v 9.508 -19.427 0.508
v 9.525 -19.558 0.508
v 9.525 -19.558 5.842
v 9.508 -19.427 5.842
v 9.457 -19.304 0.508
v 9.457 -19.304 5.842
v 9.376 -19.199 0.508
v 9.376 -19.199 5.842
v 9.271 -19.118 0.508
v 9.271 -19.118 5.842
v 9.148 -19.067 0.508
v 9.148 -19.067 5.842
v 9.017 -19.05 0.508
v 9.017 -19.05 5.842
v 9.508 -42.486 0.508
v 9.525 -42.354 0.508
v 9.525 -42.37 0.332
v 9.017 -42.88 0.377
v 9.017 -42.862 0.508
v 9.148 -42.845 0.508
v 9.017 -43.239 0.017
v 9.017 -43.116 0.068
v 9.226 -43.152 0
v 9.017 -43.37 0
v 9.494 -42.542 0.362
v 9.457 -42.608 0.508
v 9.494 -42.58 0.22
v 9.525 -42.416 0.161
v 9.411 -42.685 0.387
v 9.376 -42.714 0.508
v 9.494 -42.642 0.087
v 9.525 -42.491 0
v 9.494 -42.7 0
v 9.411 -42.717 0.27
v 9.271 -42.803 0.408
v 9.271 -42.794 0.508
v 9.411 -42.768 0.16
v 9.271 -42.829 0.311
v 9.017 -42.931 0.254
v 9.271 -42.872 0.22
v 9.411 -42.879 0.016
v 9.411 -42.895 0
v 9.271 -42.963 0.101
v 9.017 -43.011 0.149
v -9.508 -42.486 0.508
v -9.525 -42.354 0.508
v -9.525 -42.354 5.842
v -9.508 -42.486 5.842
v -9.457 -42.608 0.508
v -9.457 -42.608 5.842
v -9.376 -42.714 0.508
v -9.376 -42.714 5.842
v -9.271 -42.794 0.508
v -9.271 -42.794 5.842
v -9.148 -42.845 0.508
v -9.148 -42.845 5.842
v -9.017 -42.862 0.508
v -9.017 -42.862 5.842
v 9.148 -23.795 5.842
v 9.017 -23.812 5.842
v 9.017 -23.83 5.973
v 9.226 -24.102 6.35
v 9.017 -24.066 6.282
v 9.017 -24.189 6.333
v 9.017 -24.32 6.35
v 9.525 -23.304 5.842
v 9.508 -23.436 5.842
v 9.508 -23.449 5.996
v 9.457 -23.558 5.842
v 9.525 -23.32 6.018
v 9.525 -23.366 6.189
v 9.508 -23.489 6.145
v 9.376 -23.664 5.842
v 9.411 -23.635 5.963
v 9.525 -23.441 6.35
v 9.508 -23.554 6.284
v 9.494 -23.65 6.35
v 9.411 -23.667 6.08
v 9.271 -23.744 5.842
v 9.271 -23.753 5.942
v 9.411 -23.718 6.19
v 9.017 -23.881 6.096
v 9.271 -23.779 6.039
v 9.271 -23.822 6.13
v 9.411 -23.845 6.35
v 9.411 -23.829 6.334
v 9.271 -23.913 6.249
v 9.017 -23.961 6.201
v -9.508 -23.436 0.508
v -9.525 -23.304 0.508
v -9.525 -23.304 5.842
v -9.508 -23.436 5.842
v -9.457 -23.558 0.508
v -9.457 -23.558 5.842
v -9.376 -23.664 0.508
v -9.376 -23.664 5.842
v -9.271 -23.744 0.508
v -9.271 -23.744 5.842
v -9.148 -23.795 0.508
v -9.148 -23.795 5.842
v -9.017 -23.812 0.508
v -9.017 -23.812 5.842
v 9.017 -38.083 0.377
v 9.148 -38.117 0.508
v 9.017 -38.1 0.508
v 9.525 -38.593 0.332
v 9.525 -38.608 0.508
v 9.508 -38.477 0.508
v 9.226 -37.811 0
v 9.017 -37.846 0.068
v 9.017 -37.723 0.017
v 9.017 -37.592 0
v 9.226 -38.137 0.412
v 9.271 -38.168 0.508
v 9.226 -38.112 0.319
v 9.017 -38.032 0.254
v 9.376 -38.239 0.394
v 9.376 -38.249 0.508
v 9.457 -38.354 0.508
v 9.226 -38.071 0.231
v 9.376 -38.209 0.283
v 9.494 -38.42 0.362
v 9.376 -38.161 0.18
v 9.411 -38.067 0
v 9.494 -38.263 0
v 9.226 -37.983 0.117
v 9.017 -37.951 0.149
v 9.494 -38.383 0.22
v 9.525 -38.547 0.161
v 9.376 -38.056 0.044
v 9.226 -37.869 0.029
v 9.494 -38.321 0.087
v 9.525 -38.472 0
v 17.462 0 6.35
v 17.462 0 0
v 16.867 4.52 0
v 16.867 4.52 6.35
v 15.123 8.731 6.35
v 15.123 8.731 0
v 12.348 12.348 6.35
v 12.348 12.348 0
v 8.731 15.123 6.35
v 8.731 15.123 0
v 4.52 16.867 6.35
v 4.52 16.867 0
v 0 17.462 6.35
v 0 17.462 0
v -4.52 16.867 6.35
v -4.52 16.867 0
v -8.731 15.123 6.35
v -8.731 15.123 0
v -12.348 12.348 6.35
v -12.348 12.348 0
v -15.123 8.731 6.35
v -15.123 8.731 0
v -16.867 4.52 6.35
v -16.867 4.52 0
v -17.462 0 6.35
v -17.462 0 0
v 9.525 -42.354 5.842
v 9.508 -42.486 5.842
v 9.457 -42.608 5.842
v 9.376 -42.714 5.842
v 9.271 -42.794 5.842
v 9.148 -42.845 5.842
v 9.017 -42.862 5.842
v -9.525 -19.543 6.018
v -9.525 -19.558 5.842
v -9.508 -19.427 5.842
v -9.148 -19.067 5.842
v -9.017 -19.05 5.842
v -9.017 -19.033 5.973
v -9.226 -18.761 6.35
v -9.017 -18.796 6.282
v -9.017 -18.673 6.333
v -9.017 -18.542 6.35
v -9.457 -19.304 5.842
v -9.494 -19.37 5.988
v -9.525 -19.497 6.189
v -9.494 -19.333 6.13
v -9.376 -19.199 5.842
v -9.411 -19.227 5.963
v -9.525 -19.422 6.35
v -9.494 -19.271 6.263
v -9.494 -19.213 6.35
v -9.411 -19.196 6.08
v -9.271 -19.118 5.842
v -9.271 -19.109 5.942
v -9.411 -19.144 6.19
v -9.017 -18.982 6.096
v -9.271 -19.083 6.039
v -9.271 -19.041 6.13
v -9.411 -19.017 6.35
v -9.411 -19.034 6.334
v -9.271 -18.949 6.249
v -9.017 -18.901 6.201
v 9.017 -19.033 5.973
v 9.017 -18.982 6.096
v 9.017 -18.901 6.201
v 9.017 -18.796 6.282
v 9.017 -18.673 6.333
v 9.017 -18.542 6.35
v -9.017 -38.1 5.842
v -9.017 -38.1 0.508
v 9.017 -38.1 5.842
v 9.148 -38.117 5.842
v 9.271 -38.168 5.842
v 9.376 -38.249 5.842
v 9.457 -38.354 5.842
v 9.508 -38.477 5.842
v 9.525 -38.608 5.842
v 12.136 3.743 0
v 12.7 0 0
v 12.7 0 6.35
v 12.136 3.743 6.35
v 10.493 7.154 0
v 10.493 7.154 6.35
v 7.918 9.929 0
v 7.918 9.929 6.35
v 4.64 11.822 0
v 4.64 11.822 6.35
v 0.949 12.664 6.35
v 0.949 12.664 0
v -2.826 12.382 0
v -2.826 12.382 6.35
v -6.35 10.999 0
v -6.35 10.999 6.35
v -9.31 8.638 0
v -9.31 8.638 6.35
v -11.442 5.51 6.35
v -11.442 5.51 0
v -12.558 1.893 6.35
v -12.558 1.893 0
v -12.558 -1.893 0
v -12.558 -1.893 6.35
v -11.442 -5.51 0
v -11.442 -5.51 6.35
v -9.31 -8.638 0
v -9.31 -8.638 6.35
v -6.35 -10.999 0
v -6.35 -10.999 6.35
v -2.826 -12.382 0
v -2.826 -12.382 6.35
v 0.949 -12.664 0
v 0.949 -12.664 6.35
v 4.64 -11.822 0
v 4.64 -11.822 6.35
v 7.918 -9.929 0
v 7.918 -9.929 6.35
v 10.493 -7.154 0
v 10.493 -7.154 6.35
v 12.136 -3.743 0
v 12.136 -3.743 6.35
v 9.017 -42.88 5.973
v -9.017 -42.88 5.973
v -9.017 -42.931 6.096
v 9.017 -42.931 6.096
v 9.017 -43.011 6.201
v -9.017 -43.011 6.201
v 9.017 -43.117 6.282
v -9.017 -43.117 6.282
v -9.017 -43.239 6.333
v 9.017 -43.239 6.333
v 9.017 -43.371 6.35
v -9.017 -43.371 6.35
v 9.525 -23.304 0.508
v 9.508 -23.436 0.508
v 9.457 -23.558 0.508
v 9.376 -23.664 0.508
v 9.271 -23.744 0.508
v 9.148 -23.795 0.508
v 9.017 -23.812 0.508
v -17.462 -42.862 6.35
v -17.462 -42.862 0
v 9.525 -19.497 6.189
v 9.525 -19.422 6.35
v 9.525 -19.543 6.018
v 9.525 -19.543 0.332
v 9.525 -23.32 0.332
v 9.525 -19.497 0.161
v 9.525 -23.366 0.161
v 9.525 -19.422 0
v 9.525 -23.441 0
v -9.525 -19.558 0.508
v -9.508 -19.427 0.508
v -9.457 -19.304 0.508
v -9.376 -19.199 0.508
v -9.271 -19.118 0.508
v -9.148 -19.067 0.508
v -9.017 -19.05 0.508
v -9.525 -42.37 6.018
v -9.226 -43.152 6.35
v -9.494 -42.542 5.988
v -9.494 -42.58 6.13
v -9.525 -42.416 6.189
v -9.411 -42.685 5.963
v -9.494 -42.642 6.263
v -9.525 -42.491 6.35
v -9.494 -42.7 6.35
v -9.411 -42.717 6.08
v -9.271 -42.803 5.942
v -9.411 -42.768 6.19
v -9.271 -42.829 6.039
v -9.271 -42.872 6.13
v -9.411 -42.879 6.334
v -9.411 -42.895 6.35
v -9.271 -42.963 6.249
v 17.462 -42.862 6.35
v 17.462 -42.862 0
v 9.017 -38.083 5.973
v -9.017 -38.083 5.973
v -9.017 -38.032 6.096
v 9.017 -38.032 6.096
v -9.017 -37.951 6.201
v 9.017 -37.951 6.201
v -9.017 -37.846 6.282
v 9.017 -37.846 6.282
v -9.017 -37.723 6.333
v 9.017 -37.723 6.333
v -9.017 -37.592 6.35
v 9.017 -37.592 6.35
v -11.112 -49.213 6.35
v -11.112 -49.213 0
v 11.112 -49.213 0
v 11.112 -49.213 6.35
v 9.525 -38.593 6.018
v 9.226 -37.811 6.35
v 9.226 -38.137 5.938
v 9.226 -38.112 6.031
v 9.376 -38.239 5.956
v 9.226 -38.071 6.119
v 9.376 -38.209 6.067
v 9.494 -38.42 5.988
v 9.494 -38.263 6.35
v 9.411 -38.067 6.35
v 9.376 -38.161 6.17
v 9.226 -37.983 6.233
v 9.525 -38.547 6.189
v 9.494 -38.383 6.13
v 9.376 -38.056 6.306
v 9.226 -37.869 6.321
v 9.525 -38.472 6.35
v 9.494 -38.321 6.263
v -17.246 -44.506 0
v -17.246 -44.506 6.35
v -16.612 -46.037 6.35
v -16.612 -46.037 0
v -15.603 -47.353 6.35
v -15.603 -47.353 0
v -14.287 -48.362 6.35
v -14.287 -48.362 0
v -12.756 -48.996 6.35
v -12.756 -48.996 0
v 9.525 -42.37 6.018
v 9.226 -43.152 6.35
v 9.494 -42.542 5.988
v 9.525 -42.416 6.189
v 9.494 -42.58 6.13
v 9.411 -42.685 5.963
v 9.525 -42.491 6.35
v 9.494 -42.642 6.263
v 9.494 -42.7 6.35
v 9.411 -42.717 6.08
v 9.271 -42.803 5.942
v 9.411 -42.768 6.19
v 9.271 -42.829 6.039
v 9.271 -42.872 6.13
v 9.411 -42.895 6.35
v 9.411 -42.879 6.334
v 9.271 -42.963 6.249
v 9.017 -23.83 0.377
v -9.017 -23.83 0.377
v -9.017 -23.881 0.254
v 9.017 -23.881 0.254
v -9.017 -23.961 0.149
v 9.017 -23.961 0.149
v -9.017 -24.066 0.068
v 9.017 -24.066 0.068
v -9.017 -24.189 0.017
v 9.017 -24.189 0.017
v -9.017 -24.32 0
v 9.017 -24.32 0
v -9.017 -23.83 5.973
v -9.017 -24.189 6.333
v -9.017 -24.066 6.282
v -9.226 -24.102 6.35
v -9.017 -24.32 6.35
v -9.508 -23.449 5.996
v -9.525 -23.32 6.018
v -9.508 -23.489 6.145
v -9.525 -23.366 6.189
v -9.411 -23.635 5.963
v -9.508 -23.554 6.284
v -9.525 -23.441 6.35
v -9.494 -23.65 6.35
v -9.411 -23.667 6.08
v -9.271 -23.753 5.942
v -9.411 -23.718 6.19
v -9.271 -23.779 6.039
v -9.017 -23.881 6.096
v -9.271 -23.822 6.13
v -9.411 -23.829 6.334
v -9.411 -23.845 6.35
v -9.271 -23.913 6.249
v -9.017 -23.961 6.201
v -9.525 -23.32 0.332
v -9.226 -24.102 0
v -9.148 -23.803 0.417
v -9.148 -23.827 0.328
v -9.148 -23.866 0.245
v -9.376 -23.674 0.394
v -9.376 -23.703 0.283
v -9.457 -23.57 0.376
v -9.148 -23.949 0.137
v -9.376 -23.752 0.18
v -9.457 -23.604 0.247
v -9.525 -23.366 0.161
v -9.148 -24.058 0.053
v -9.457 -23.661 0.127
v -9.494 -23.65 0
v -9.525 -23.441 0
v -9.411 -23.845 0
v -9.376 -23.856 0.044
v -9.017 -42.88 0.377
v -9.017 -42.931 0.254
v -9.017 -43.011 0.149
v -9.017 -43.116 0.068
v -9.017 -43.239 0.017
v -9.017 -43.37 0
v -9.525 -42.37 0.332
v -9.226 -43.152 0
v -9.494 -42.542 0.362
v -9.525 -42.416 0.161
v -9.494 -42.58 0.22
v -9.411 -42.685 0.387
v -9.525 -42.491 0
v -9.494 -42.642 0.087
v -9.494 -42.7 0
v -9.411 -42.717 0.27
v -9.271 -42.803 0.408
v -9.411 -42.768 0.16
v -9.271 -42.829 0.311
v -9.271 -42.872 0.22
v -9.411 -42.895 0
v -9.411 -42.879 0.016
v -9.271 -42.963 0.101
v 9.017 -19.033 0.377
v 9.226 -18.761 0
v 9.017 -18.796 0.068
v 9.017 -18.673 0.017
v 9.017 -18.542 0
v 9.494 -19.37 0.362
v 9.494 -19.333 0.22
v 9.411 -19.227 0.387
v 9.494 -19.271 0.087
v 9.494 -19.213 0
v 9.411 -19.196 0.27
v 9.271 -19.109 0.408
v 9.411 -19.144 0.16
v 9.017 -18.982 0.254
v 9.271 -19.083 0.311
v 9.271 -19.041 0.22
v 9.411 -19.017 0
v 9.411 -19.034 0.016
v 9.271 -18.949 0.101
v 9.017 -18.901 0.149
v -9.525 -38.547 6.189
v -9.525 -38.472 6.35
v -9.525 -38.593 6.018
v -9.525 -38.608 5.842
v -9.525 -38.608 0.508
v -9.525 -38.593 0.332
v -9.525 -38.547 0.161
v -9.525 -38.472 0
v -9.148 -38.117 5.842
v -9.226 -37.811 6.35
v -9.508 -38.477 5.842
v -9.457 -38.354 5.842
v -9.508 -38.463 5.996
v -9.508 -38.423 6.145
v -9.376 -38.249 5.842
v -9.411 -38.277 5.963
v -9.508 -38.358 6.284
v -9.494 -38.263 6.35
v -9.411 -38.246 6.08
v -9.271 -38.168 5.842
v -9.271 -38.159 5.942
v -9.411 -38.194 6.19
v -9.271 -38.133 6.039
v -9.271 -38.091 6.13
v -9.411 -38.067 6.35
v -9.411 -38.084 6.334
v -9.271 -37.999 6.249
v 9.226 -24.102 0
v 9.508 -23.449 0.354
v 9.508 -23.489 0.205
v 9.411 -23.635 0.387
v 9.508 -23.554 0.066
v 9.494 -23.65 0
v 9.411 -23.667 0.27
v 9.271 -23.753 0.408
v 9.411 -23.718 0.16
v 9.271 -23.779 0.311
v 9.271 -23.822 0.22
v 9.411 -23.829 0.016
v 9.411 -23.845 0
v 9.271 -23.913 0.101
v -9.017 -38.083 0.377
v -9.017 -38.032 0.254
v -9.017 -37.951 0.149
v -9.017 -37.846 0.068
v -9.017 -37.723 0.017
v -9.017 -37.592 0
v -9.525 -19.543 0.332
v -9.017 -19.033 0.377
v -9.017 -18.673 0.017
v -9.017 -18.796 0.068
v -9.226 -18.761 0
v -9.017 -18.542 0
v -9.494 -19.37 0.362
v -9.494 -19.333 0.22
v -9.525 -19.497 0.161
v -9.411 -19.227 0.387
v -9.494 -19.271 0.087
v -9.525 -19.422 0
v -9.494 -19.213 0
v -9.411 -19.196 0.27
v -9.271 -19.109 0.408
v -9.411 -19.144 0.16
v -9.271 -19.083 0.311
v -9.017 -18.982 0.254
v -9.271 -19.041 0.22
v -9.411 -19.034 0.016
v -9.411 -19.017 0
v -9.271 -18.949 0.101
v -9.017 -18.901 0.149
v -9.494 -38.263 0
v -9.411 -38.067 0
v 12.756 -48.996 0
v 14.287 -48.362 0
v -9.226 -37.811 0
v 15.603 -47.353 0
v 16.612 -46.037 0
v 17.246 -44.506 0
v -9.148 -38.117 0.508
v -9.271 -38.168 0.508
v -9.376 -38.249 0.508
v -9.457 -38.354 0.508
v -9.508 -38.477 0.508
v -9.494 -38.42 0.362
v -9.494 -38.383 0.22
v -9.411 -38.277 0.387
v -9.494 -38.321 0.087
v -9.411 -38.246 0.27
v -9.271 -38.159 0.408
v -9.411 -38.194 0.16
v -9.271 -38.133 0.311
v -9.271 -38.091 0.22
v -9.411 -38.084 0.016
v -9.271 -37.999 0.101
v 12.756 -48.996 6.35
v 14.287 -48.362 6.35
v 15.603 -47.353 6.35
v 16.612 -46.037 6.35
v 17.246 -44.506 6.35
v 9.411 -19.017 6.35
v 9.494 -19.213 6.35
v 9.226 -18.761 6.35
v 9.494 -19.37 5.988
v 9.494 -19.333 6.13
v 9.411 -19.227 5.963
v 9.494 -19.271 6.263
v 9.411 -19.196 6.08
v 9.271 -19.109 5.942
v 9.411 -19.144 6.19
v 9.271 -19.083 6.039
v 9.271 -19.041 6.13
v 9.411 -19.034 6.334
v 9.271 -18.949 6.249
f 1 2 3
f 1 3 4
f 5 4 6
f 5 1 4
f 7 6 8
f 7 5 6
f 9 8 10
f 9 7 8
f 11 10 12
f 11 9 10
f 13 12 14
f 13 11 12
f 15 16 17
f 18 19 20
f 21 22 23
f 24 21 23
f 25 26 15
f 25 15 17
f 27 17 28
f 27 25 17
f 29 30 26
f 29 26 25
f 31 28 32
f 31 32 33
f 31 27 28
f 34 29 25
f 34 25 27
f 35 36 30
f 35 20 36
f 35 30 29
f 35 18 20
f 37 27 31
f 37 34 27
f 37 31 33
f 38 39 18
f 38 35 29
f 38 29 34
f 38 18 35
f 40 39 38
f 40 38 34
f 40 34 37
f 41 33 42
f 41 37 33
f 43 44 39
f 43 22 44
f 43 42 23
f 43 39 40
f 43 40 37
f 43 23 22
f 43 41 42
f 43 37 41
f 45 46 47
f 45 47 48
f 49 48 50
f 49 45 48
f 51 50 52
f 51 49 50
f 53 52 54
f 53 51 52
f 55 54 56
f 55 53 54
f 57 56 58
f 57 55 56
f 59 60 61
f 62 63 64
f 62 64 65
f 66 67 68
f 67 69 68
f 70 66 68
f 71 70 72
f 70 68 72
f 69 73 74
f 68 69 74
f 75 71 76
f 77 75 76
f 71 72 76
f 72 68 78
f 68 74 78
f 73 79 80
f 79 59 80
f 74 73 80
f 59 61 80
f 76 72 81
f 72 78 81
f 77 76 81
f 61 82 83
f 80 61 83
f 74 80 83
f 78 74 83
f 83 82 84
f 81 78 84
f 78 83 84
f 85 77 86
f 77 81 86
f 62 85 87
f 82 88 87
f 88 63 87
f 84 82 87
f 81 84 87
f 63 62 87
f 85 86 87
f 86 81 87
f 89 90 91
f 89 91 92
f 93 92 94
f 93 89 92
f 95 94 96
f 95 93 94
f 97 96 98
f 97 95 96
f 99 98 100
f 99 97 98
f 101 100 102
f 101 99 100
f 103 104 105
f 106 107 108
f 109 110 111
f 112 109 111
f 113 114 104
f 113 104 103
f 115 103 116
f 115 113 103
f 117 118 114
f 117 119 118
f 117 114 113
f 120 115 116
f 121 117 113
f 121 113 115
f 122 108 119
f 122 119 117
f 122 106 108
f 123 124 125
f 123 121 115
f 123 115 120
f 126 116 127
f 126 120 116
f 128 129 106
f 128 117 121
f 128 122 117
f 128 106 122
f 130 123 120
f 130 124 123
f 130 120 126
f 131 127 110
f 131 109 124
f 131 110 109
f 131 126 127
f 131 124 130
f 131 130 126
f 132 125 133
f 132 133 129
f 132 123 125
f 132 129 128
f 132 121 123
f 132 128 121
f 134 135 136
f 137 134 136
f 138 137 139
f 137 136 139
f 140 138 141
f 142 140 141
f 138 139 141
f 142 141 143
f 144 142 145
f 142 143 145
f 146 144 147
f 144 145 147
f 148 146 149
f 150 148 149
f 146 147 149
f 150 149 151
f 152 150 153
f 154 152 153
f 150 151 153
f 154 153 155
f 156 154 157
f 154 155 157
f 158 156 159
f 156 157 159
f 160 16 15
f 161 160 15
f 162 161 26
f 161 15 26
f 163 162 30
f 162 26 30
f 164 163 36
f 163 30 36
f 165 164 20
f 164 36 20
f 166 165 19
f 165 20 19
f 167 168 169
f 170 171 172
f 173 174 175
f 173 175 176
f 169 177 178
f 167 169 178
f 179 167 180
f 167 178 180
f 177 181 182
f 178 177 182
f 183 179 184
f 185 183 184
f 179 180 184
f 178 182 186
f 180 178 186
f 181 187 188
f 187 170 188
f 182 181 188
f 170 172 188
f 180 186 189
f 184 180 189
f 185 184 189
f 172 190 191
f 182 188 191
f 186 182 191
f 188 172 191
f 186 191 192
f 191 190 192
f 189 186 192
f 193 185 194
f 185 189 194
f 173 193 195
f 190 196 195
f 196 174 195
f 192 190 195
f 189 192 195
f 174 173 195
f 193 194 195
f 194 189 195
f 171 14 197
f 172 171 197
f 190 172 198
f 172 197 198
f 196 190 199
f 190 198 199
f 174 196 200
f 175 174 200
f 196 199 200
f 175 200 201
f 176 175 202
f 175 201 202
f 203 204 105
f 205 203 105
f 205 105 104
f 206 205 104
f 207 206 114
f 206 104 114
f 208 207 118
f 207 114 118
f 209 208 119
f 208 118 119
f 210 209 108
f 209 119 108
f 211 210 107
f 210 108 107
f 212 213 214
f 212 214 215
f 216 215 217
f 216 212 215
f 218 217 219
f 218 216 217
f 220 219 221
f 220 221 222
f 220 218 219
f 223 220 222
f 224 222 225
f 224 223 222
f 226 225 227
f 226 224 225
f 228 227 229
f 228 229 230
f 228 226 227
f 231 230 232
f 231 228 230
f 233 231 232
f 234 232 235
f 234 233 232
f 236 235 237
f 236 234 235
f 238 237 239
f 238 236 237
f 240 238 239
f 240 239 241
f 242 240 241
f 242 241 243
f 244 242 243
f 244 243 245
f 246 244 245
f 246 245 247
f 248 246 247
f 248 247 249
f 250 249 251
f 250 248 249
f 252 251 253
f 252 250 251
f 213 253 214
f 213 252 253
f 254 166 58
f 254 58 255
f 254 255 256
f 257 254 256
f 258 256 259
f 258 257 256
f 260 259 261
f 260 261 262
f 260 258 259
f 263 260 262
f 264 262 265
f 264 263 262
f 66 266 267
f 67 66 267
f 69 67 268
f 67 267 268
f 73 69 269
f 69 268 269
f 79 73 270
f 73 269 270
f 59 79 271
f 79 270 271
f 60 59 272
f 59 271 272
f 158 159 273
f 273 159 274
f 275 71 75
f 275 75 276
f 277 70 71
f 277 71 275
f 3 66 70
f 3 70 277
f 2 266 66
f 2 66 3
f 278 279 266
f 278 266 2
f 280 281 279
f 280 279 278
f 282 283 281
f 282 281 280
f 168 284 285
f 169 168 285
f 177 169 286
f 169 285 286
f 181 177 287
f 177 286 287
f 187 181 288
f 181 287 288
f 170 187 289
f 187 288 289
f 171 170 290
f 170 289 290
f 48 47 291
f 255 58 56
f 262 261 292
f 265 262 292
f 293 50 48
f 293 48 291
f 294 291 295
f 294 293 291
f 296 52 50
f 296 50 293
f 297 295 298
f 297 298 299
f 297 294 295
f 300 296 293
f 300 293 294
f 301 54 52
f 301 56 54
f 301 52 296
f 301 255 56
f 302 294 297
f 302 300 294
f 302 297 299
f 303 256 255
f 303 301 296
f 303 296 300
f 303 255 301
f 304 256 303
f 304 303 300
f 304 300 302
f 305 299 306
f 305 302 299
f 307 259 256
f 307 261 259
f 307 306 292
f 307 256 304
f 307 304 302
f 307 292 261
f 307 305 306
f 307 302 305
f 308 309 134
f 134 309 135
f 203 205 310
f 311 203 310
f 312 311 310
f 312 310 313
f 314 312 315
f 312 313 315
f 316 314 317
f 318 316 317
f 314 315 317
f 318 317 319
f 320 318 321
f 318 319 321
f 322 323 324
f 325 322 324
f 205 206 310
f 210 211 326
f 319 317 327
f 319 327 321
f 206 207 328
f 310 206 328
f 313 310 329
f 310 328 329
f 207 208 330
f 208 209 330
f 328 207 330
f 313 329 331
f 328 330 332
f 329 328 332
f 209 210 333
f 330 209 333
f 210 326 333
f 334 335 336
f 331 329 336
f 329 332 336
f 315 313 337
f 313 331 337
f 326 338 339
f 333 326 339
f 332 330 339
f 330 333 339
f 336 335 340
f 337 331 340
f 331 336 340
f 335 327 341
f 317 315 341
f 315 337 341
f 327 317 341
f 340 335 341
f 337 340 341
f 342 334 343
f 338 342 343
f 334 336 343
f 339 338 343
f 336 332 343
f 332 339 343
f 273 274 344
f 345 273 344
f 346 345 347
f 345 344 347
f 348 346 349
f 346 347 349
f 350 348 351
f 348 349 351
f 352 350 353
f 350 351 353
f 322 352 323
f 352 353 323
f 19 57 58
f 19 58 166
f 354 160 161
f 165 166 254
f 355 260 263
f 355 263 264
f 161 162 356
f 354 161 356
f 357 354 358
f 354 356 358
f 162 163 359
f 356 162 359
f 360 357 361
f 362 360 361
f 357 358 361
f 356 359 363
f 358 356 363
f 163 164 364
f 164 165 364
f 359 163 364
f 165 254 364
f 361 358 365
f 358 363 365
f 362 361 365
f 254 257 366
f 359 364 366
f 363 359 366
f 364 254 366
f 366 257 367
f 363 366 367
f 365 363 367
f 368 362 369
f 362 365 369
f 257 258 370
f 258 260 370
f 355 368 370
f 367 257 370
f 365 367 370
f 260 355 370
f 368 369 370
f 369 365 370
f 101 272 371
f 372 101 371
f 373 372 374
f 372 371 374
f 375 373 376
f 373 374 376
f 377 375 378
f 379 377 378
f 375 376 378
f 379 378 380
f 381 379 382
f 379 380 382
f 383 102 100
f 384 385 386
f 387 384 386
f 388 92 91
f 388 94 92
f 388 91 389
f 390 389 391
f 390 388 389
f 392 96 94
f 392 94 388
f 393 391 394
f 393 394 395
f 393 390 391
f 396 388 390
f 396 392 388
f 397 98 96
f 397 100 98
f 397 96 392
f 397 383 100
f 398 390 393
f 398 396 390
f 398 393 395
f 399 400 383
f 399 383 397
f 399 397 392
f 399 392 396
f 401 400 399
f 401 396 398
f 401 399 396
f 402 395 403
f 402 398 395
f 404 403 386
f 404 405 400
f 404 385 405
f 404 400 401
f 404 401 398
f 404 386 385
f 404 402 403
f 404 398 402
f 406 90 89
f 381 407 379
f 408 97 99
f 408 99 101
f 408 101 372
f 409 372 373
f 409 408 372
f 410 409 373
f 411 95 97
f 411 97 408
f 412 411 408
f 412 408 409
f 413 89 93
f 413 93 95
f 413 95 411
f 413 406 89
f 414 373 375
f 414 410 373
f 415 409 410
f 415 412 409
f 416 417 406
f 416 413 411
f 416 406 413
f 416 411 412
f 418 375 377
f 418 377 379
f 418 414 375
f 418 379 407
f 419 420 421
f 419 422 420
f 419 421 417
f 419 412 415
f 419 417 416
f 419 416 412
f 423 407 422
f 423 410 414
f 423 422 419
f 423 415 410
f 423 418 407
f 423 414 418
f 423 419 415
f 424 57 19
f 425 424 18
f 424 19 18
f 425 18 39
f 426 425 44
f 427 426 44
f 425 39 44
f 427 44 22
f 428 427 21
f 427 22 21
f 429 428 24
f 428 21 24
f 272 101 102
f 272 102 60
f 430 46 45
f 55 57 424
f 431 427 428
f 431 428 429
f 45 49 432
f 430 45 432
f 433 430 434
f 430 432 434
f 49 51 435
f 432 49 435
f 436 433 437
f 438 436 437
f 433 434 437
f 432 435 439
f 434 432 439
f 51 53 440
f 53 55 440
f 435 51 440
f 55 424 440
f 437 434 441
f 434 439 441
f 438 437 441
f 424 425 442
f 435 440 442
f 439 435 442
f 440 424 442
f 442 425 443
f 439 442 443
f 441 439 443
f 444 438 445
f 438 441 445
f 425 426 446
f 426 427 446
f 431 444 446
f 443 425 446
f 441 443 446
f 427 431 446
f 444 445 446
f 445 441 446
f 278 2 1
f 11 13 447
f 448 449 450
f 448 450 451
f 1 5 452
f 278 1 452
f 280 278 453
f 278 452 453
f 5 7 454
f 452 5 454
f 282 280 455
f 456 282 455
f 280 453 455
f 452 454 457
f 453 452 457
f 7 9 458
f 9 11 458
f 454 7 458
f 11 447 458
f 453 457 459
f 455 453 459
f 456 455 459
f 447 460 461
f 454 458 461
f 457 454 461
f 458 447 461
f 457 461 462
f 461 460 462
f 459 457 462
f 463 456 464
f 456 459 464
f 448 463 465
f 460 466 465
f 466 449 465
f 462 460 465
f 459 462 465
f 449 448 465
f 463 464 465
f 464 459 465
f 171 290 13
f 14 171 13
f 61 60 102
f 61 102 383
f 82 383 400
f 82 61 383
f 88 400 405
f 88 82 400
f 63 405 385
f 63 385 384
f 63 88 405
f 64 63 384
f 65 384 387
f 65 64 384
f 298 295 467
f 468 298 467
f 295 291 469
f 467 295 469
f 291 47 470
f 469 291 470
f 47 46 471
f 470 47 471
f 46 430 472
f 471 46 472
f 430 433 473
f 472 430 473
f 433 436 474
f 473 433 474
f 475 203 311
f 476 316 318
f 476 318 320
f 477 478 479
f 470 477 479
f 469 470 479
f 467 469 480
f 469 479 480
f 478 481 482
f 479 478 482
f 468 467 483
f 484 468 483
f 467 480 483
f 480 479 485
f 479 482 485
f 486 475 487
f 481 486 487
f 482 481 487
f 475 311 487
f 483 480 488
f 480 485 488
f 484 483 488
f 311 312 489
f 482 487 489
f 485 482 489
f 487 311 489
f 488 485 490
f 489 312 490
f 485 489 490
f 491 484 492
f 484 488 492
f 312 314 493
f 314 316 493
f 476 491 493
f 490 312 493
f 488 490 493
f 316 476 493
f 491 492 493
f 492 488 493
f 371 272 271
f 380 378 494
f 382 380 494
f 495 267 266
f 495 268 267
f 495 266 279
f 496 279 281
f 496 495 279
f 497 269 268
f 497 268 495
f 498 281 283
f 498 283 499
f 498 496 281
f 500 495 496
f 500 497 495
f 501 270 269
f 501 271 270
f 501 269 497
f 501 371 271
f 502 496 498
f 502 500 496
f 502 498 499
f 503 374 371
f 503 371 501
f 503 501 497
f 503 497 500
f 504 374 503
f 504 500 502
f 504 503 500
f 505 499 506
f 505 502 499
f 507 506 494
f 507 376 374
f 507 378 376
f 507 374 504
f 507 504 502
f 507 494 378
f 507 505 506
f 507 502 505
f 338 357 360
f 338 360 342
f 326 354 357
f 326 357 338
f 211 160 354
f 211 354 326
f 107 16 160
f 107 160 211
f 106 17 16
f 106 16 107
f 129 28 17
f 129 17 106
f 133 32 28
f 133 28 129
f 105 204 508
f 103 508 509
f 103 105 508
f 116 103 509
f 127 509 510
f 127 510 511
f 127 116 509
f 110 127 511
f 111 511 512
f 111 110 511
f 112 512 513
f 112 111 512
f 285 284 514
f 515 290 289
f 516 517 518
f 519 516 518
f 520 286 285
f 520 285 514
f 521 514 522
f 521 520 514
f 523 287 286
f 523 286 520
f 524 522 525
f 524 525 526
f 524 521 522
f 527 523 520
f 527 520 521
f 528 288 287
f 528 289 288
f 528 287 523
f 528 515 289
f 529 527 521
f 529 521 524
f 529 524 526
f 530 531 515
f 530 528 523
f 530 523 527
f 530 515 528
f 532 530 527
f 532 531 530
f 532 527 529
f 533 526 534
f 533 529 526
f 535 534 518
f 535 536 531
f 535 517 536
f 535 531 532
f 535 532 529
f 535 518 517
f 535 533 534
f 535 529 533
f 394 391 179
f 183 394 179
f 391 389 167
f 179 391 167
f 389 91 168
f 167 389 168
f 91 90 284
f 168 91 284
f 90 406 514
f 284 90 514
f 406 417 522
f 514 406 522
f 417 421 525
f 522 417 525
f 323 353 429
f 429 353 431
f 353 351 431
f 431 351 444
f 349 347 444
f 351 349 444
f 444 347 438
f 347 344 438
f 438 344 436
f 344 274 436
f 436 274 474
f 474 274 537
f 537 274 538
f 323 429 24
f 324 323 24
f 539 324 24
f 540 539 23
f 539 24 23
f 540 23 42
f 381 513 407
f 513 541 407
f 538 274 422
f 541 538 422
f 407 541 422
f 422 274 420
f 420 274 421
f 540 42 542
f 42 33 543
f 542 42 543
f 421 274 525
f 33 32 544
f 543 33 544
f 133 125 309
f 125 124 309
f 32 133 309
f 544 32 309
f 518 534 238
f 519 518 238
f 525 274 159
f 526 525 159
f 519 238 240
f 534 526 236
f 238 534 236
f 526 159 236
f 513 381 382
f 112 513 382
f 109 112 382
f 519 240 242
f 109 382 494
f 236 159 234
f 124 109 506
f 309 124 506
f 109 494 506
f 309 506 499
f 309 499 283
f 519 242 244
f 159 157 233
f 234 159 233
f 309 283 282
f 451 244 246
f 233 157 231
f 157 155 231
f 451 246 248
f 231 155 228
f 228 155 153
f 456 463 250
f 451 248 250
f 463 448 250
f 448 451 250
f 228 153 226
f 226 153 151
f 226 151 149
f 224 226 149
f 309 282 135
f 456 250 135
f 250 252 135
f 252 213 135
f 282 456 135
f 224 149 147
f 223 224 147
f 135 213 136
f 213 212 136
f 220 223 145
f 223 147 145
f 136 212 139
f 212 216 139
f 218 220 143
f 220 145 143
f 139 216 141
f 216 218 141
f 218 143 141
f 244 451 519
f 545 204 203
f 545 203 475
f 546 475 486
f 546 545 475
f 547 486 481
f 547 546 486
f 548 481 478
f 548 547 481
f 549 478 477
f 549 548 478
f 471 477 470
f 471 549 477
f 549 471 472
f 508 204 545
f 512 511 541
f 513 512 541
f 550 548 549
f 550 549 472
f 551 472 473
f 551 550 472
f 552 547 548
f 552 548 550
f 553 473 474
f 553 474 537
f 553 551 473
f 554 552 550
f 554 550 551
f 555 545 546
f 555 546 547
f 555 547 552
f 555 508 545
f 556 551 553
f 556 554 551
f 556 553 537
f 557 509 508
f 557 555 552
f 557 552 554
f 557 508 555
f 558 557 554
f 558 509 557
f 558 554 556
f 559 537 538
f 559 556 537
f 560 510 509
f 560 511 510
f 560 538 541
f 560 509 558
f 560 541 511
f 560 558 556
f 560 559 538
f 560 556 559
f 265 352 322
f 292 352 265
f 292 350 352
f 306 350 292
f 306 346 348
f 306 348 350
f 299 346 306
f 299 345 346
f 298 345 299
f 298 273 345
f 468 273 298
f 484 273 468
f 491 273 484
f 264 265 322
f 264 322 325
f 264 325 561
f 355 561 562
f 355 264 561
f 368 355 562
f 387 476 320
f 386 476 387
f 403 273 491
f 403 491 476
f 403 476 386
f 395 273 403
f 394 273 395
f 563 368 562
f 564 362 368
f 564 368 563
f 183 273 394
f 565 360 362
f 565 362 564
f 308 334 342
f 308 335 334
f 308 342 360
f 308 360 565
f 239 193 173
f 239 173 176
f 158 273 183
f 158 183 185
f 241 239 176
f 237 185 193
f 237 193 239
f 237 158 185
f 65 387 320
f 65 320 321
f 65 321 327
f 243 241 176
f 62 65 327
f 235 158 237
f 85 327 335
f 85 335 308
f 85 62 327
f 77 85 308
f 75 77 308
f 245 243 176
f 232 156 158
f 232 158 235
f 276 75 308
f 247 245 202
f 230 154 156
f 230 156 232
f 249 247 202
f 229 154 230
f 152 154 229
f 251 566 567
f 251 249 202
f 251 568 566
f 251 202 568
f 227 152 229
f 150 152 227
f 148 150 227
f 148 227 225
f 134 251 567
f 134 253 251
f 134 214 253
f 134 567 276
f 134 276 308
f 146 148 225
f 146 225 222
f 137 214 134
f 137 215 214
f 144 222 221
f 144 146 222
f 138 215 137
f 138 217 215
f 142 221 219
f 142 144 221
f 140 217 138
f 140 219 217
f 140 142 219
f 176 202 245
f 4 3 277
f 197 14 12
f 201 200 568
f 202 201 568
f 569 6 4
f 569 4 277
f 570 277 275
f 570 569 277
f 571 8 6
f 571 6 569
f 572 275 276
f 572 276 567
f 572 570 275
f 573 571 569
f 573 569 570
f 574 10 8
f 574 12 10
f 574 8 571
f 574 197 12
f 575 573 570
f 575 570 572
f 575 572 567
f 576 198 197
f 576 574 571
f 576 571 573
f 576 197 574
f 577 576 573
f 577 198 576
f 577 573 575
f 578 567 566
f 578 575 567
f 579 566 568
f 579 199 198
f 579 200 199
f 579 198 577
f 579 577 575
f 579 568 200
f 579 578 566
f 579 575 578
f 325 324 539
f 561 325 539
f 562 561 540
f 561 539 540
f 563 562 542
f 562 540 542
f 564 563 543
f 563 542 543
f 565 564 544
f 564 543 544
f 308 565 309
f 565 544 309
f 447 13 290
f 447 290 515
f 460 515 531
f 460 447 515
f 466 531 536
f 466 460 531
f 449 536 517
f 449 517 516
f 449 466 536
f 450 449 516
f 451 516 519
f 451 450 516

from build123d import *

# Parameters (mm, degrees)
F0_W         = 19.05
F0_H         = 4.7625
F0_R         = 12.7
F1_DEPTH     = 6.35
F2_R         = 0.508
F3_T1_DEPTH  = 5.334
F3_T6_ANGLE  = 233.2969892374
F3_T11_ANGLE = 233.2969892374
F3_T16_ANGLE = 233.2969892374
F3_T21_ANGLE = 233.2969892374
F3_T26_ANGLE = 233.2969892374
F3_T31_ANGLE = 233.2969892374
F3_T36_ANGLE = 233.2969892374
F3_T41_ANGLE = 233.2969892374
F3_T46_ANGLE = 233.2969892374
F3_T51_ANGLE = 233.2969892374
F3_T56_ANGLE = 233.2969892374
F3_T61_ANGLE = 233.2969892374
F3_T66_ANGLE = 233.2969892374
F3_T71_ANGLE = 233.2969892374
F3_T76_ANGLE = 233.2969892374
F3_T81_ANGLE = 233.2969892374


# Not quite as in the source:
# - a fillet or chamfer that OpenCascade refuses, or shapes differently, is made with other operations: its cross-section is extruded or revolved along the edge and cut away or added


with BuildPart() as f1:
    # F0 (on Top) → F1 (new body)
    with BuildSketch(Plane.XY):
        with BuildLine():
            Line((17.4625, -42.8625), (17.4625, 0))
            ThreePointArc((17.4625, 0), (0, 17.4625), (-17.4625, 0))
            Line((-17.4625, 0), (-17.4625, -42.8625))
            ThreePointArc((-17.4625, -42.8625), (-15.6026280605, -47.3526280605), (-11.1125, -49.2125))
            Line((-11.1125, -49.2125), (11.1125, -49.2125))
            ThreePointArc((11.1125, -49.2125), (15.6026280605, -47.3526280605), (17.4625, -42.8625))
        make_face()
        with Locations((0, -40.48125)):
            Rectangle(F0_W, F0_H, mode=Mode.SUBTRACT)
        with Locations((0, -21.43125)):
            Rectangle(F0_W, F0_H, mode=Mode.SUBTRACT)
        Circle(F0_R, mode=Mode.SUBTRACT)
    extrude(amount=F1_DEPTH)

    # F2
    f2_edges = [f1.edges().sort_by_distance(p)[0] for p in [
        (0, -23.8125, 6.35),
        (0, -23.8125, 0),
        (0, -19.05, 6.35),
        (0, -38.1, 6.35),
        (0, -42.8625, 6.35),
        (0, -38.1, 0),
        (0, -19.05, 0),
        (0, -42.8625, 0),
    ]]
    fillet(f2_edges, radius=F2_R)

    # F3: fillet of radius 0.508 on 8 edges, made by hand

    # F3_s2 → F3_t1 (join)
    with BuildSketch(Plane.XY.offset(0.508)):
        with BuildLine():
            ThreePointArc((9.525, -42.3545), (9.3762102448, -42.7137102448), (9.017, -42.8625))
            Line((9.017, -42.8625), (9.525, -42.8625))
            Line((9.525, -42.8625), (9.525, -42.3545))
        make_face()
        with BuildLine():
            ThreePointArc((9.525, -23.3045), (9.3762102448, -23.6637102448), (9.017, -23.8125))
            Line((9.017, -23.8125), (9.525, -23.8125))
            Line((9.525, -23.8125), (9.525, -23.3045))
        make_face()
        with BuildLine():
            ThreePointArc((-9.525, -42.3545), (-9.3762102448, -42.7137102448), (-9.017, -42.8625))
            Line((-9.017, -42.8625), (-9.525, -42.8625))
            Line((-9.525, -42.8625), (-9.525, -42.3545))
        make_face()
        with BuildLine():
            ThreePointArc((9.525, -19.558), (9.3762102448, -19.1987897552), (9.017, -19.05))
            Line((9.017, -19.05), (9.525, -19.05))
            Line((9.525, -19.05), (9.525, -19.558))
        make_face()
        with BuildLine():
            ThreePointArc((-9.525, -19.558), (-9.3762102448, -19.1987897552), (-9.017, -19.05))
            Line((-9.017, -19.05), (-9.525, -19.05))
            Line((-9.525, -19.05), (-9.525, -19.558))
        make_face()
        with BuildLine():
            ThreePointArc((-9.525, -23.3045), (-9.3762102448, -23.6637102448), (-9.017, -23.8125))
            Line((-9.017, -23.8125), (-9.525, -23.8125))
            Line((-9.525, -23.8125), (-9.525, -23.3045))
        make_face()
        with BuildLine():
            ThreePointArc((-9.017, -38.1), (-9.3762102448, -38.2487897552), (-9.525, -38.608))
            Line((-9.525, -38.608), (-9.525, -38.1))
            Line((-9.525, -38.1), (-9.017, -38.1))
        make_face()
        with BuildLine():
            ThreePointArc((9.017, -38.1), (9.3762102448, -38.2487897552), (9.525, -38.608))
            Line((9.525, -38.608), (9.525, -38.1))
            Line((9.525, -38.1), (9.017, -38.1))
        make_face()
    extrude(amount=F3_T1_DEPTH)


with BuildPart() as f3_tool4:
    # F3_s5 → F3_t6 (revolve)
    with BuildSketch(Plane.XY.offset(0.508)):
        with BuildLine():
            ThreePointArc((9.017, -38.1), (9.3762102448, -38.2487897552), (9.525, -38.608))
            Line((9.525, -38.608), (9.525, -38.1))
            Line((9.525, -38.1), (9.017, -38.1))
        make_face()
    revolve(axis=Axis((9.525, -37.592, 0.508), (1, 0, 0)), revolution_arc=F3_T6_ANGLE)

    split(bisect_by=Plane.XY, keep=Keep.TOP)


with BuildPart() as f1_1:
    add(f1.part)

    # F3_t3: union F3_tool4
    add(f3_tool4.part)


with BuildPart() as f3_tool9:
    # F3_s10 → F3_t11 (revolve)
    with BuildSketch(Plane.XY.offset(5.842)):
        with BuildLine():
            ThreePointArc((9.017, -38.1), (9.3762102448, -38.2487897552), (9.525, -38.608))
            Line((9.525, -38.608), (9.525, -38.1))
            Line((9.525, -38.1), (9.017, -38.1))
        make_face()
    revolve(axis=Axis((9.525, -37.592, 5.842), (-1, 0, 0)), revolution_arc=F3_T11_ANGLE)

    split(bisect_by=Plane.XY.offset(6.35), keep=Keep.BOTTOM)


with BuildPart() as f1_2:
    add(f1_1.part)

    # F3_t8: union F3_tool9
    add(f3_tool9.part)


with BuildPart() as f3_tool14:
    # F3_s15 → F3_t16 (revolve)
    with BuildSketch(Plane.XY.offset(0.508)):
        with BuildLine():
            ThreePointArc((-9.525, -38.608), (-9.3762102448, -38.2487897552), (-9.017, -38.1))
            Line((-9.017, -38.1), (-9.525, -38.1))
            Line((-9.525, -38.1), (-9.525, -38.608))
        make_face()
    revolve(axis=Axis((-9.525, -37.592, 0.508), (1, 0, 0)), revolution_arc=F3_T16_ANGLE)

    split(bisect_by=Plane.XY, keep=Keep.TOP)


with BuildPart() as f1_3:
    add(f1_2.part)

    # F3_t13: union F3_tool14
    add(f3_tool14.part)


with BuildPart() as f3_tool19:
    # F3_s20 → F3_t21 (revolve)
    with BuildSketch(Plane.XY.offset(5.842)):
        with BuildLine():
            ThreePointArc((-9.525, -38.608), (-9.3762102448, -38.2487897552), (-9.017, -38.1))
            Line((-9.017, -38.1), (-9.525, -38.1))
            Line((-9.525, -38.1), (-9.525, -38.608))
        make_face()
    revolve(axis=Axis((-9.525, -37.592, 5.842), (-1, 0, 0)), revolution_arc=F3_T21_ANGLE)

    split(bisect_by=Plane.XY.offset(6.35), keep=Keep.BOTTOM)


with BuildPart() as f1_4:
    add(f1_3.part)

    # F3_t18: union F3_tool19
    add(f3_tool19.part)


with BuildPart() as f3_tool24:
    # F3_s25 → F3_t26 (revolve)
    with BuildSketch(Plane.XY.offset(0.508)):
        with BuildLine():
            ThreePointArc((-9.017, -23.8125), (-9.3762102448, -23.6637102448), (-9.525, -23.3045))
            Line((-9.525, -23.3045), (-9.525, -23.8125))
            Line((-9.525, -23.8125), (-9.017, -23.8125))
        make_face()
    revolve(axis=Axis((-9.525, -24.3205, 0.508), (-1, 0, 0)), revolution_arc=F3_T26_ANGLE)

    split(bisect_by=Plane.XY, keep=Keep.TOP)


with BuildPart() as f1_5:
    add(f1_4.part)

    # F3_t23: union F3_tool24
    add(f3_tool24.part)


with BuildPart() as f3_tool29:
    # F3_s30 → F3_t31 (revolve)
    with BuildSketch(Plane.XY.offset(5.842)):
        with BuildLine():
            ThreePointArc((-9.525, -23.3045), (-9.3762102448, -23.6637102448), (-9.017, -23.8125))
            Line((-9.017, -23.8125), (-9.525, -23.8125))
            Line((-9.525, -23.8125), (-9.525, -23.3045))
        make_face()
    revolve(axis=Axis((-9.525, -24.3205, 5.842), (1, 0, 0)), revolution_arc=F3_T31_ANGLE)

    split(bisect_by=Plane.XY.offset(6.35), keep=Keep.BOTTOM)


with BuildPart() as f1_6:
    add(f1_5.part)

    # F3_t28: union F3_tool29
    add(f3_tool29.part)


with BuildPart() as f3_tool34:
    # F3_s35 → F3_t36 (revolve)
    with BuildSketch(Plane.XY.offset(0.508)):
        with BuildLine():
            ThreePointArc((-9.525, -19.558), (-9.3762102448, -19.1987897552), (-9.017, -19.05))
            Line((-9.017, -19.05), (-9.525, -19.05))
            Line((-9.525, -19.05), (-9.525, -19.558))
        make_face()
    revolve(axis=Axis((-9.525, -18.542, 0.508), (1, 0, 0)), revolution_arc=F3_T36_ANGLE)

    split(bisect_by=Plane.XY, keep=Keep.TOP)


with BuildPart() as f1_7:
    add(f1_6.part)

    # F3_t33: union F3_tool34
    add(f3_tool34.part)


with BuildPart() as f3_tool39:
    # F3_s40 → F3_t41 (revolve)
    with BuildSketch(Plane.XY.offset(5.842)):
        with BuildLine():
            ThreePointArc((-9.525, -19.558), (-9.3762102448, -19.1987897552), (-9.017, -19.05))
            Line((-9.017, -19.05), (-9.525, -19.05))
            Line((-9.525, -19.05), (-9.525, -19.558))
        make_face()
    revolve(axis=Axis((-9.525, -18.542, 5.842), (-1, 0, 0)), revolution_arc=F3_T41_ANGLE)

    split(bisect_by=Plane.XY.offset(6.35), keep=Keep.BOTTOM)


with BuildPart() as f1_8:
    add(f1_7.part)

    # F3_t38: union F3_tool39
    add(f3_tool39.part)


with BuildPart() as f3_tool44:
    # F3_s45 → F3_t46 (revolve)
    with BuildSketch(Plane.XY.offset(0.508)):
        with BuildLine():
            ThreePointArc((9.525, -19.558), (9.3762102448, -19.1987897552), (9.017, -19.05))
            Line((9.017, -19.05), (9.525, -19.05))
            Line((9.525, -19.05), (9.525, -19.558))
        make_face()
    revolve(axis=Axis((9.525, -18.542, 0.508), (1, 0, 0)), revolution_arc=F3_T46_ANGLE)

    split(bisect_by=Plane.XY, keep=Keep.TOP)


with BuildPart() as f1_9:
    add(f1_8.part)

    # F3_t43: union F3_tool44
    add(f3_tool44.part)


with BuildPart() as f3_tool49:
    # F3_s50 → F3_t51 (revolve)
    with BuildSketch(Plane.XY.offset(5.842)):
        with BuildLine():
            ThreePointArc((9.525, -19.558), (9.3762102448, -19.1987897552), (9.017, -19.05))
            Line((9.017, -19.05), (9.525, -19.05))
            Line((9.525, -19.05), (9.525, -19.558))
        make_face()
    revolve(axis=Axis((9.525, -18.542, 5.842), (-1, 0, 0)), revolution_arc=F3_T51_ANGLE)

    split(bisect_by=Plane.XY.offset(6.35), keep=Keep.BOTTOM)


with BuildPart() as f1_10:
    add(f1_9.part)

    # F3_t48: union F3_tool49
    add(f3_tool49.part)


with BuildPart() as f3_tool54:
    # F3_s55 → F3_t56 (revolve)
    with BuildSketch(Plane.XY.offset(0.508)):
        with BuildLine():
            ThreePointArc((-9.525, -42.3545), (-9.3762102448, -42.7137102448), (-9.017, -42.8625))
            Line((-9.017, -42.8625), (-9.525, -42.8625))
            Line((-9.525, -42.8625), (-9.525, -42.3545))
        make_face()
    revolve(axis=Axis((-9.525, -43.3705, 0.508), (-1, 0, 0)), revolution_arc=F3_T56_ANGLE)

    split(bisect_by=Plane.XY, keep=Keep.TOP)


with BuildPart() as f1_11:
    add(f1_10.part)

    # F3_t53: union F3_tool54
    add(f3_tool54.part)


with BuildPart() as f3_tool59:
    # F3_s60 → F3_t61 (revolve)
    with BuildSketch(Plane.XY.offset(5.842)):
        with BuildLine():
            ThreePointArc((-9.525, -42.3545), (-9.3762102448, -42.7137102448), (-9.017, -42.8625))
            Line((-9.017, -42.8625), (-9.525, -42.8625))
            Line((-9.525, -42.8625), (-9.525, -42.3545))
        make_face()
    revolve(axis=Axis((-9.525, -43.3705, 5.842), (1, 0, 0)), revolution_arc=F3_T61_ANGLE)

    split(bisect_by=Plane.XY.offset(6.35), keep=Keep.BOTTOM)


with BuildPart() as f1_12:
    add(f1_11.part)

    # F3_t58: union F3_tool59
    add(f3_tool59.part)


with BuildPart() as f3_tool64:
    # F3_s65 → F3_t66 (revolve)
    with BuildSketch(Plane.XY.offset(0.508)):
        with BuildLine():
            ThreePointArc((9.525, -23.3045), (9.3762102448, -23.6637102448), (9.017, -23.8125))
            Line((9.017, -23.8125), (9.525, -23.8125))
            Line((9.525, -23.8125), (9.525, -23.3045))
        make_face()
    revolve(axis=Axis((9.525, -24.3205, 0.508), (-1, 0, 0)), revolution_arc=F3_T66_ANGLE)

    split(bisect_by=Plane.XY, keep=Keep.TOP)


with BuildPart() as f1_13:
    add(f1_12.part)

    # F3_t63: union F3_tool64
    add(f3_tool64.part)


with BuildPart() as f3_tool69:
    # F3_s70 → F3_t71 (revolve)
    with BuildSketch(Plane.XY.offset(5.842)):
        with BuildLine():
            ThreePointArc((9.525, -23.3045), (9.3762102448, -23.6637102448), (9.017, -23.8125))
            Line((9.017, -23.8125), (9.525, -23.8125))
            Line((9.525, -23.8125), (9.525, -23.3045))
        make_face()
    revolve(axis=Axis((9.525, -24.3205, 5.842), (1, 0, 0)), revolution_arc=F3_T71_ANGLE)

    split(bisect_by=Plane.XY.offset(6.35), keep=Keep.BOTTOM)


with BuildPart() as f1_14:
    add(f1_13.part)

    # F3_t68: union F3_tool69
    add(f3_tool69.part)


with BuildPart() as f3_tool74:
    # F3_s75 → F3_t76 (revolve)
    with BuildSketch(Plane.XY.offset(0.508)):
        with BuildLine():
            ThreePointArc((9.525, -42.3545), (9.3762102448, -42.7137102448), (9.017, -42.8625))
            Line((9.017, -42.8625), (9.525, -42.8625))
            Line((9.525, -42.8625), (9.525, -42.3545))
        make_face()
    revolve(axis=Axis((9.525, -43.3705, 0.508), (-1, 0, 0)), revolution_arc=F3_T76_ANGLE)

    split(bisect_by=Plane.XY, keep=Keep.TOP)


with BuildPart() as f1_15:
    add(f1_14.part)

    # F3_t73: union F3_tool74
    add(f3_tool74.part)


with BuildPart() as f3_tool79:
    # F3_s80 → F3_t81 (revolve)
    with BuildSketch(Plane.XY.offset(5.842)):
        with BuildLine():
            ThreePointArc((9.525, -42.3545), (9.3762102448, -42.7137102448), (9.017, -42.8625))
            Line((9.017, -42.8625), (9.525, -42.8625))
            Line((9.525, -42.8625), (9.525, -42.3545))
        make_face()
    revolve(axis=Axis((9.525, -43.3705, 5.842), (1, 0, 0)), revolution_arc=F3_T81_ANGLE)

    split(bisect_by=Plane.XY.offset(6.35), keep=Keep.BOTTOM)


with BuildPart() as f1_16:
    add(f1_15.part)

    # F3_t78: union F3_tool79
    add(f3_tool79.part)


solid = f1_16.part
